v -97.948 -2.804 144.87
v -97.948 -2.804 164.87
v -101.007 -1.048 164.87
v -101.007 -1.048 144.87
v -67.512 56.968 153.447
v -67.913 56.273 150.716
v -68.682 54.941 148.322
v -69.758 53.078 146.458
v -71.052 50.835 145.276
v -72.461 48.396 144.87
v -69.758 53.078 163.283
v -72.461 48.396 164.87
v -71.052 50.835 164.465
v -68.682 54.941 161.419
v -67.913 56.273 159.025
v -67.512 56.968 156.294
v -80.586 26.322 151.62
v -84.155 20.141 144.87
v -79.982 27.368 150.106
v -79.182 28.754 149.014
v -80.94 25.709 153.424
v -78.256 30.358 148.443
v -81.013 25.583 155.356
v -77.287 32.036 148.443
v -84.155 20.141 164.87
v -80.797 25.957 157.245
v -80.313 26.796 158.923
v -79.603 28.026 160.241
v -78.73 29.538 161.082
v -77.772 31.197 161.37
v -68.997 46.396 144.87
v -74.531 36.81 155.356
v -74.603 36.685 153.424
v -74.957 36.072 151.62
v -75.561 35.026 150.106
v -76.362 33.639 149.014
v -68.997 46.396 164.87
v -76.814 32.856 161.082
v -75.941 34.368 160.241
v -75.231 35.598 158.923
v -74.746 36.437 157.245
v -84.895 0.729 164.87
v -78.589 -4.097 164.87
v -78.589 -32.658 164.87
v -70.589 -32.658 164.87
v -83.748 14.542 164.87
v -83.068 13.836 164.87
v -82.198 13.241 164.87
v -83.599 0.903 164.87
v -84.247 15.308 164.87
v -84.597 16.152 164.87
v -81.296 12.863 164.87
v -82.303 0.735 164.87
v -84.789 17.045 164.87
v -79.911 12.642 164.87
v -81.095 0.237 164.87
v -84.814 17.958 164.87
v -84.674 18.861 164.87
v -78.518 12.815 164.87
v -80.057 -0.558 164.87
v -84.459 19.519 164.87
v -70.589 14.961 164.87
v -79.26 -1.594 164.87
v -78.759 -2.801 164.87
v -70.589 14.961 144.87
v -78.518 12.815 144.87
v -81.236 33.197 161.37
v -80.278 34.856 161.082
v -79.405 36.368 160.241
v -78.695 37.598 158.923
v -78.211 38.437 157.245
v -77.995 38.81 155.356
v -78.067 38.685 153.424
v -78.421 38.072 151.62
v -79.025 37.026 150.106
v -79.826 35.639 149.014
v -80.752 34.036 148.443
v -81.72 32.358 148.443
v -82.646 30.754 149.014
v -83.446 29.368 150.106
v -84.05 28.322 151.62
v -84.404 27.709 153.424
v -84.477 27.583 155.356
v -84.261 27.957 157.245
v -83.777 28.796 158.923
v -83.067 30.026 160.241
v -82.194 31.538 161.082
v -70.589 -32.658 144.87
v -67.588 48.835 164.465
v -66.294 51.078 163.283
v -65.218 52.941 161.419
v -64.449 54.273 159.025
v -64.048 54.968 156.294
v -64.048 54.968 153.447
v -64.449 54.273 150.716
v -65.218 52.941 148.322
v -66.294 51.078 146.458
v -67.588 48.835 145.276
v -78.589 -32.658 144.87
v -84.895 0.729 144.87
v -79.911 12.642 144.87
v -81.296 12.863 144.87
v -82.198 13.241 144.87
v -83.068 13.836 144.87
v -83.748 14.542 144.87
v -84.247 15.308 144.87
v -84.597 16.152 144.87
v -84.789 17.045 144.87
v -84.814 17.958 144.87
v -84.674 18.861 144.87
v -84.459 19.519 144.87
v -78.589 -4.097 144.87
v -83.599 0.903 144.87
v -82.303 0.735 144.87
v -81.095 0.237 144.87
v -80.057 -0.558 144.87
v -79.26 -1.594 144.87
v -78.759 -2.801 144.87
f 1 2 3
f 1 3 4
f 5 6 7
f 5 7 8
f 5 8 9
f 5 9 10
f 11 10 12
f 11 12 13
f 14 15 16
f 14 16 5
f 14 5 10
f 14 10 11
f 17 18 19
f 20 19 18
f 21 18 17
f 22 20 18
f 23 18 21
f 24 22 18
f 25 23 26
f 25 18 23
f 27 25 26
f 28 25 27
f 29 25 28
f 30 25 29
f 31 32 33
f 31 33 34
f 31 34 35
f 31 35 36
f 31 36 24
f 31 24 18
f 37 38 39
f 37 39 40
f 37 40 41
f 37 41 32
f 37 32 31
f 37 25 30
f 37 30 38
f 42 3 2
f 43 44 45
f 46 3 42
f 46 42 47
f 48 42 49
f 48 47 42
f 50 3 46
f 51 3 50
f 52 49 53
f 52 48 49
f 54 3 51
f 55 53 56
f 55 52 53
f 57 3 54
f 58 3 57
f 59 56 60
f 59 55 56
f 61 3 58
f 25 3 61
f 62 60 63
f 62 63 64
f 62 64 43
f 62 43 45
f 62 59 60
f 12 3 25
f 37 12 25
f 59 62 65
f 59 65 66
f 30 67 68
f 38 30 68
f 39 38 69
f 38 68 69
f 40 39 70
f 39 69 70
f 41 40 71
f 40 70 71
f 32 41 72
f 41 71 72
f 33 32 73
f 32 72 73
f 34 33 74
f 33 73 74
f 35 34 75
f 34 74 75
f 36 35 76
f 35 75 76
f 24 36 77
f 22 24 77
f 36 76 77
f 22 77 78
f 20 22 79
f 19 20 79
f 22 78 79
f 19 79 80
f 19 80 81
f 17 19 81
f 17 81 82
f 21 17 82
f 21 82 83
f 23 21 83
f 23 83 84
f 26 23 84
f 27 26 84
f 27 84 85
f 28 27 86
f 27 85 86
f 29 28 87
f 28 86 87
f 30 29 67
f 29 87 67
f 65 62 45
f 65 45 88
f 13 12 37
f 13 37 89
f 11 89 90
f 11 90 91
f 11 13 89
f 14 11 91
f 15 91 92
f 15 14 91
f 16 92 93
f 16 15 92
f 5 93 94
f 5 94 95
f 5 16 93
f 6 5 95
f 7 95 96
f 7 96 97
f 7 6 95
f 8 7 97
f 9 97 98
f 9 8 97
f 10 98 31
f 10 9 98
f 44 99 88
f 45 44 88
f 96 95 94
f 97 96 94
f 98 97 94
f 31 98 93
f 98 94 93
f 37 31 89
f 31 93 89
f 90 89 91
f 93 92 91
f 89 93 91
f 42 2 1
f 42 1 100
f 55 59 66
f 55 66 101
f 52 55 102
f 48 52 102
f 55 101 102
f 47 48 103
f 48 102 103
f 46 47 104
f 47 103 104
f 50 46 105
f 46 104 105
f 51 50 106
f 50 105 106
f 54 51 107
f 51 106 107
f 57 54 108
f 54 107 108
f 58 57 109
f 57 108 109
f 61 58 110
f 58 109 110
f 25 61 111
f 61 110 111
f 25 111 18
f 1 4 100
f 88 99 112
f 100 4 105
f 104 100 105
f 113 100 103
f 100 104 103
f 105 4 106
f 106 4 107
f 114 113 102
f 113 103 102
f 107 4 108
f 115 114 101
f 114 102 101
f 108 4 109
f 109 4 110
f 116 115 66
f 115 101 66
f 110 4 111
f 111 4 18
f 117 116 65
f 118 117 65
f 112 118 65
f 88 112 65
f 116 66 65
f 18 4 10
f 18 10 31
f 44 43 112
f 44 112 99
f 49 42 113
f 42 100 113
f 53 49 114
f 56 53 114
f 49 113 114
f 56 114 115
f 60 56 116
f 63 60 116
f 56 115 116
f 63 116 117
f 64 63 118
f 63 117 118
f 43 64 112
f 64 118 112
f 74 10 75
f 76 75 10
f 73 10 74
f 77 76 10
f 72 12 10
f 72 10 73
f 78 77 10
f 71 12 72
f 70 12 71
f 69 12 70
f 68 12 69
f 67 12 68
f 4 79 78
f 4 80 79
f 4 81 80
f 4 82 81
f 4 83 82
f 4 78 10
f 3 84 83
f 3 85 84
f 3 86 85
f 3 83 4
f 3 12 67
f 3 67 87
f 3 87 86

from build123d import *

# Parameters (mm, degrees)
BOSS_EXTRU_1_DEPTH      = 20
CONG_1_R                = 5
CHANFREIN1_SIZE2        = 5
CHANFREIN1_SIZE         = 3.535545122
BOSS_EXTRU_2_DEPTH      = 4
ESQUISSE9_W             = 20
ESQUISSE9_H             = 48.160254038
ENL_V_MAT_EXTRU_5_DEPTH = 2
ESQUISSE10_R            = 6.5
ENL_V_MAT_EXTRU_6_DEPTH = 4


with BuildPart() as part:
    # Esquisse1 → Boss.-Extru.1 (new body)
    with BuildSketch(Plane.XY.offset(164.870489571)):
        Polygon((-68.588600326, 5.142765071), (-68.588600326, 15.502551901), (-78.588600326, 12.796044343), (-90.211700696, 9.650243444), (-68.996801706, 46.395526372), (-72.460903321, 48.395526372), (-102.774849854, -4.109769201), (-78.588600326, 2.436257514), (-78.588600326, -32.657702137), (-68.588600326, -32.657702137), align=None)
    extrude(amount=-BOSS_EXTRU_1_DEPTH)

    # Congé1
    cong_1_edges = [part.edges().sort_by_distance(p)[0] for p in [
        (-90.211700696, 9.650243444, 154.870489571),
        (-78.588600326, 2.436257514, 154.870489571),
    ]]
    fillet(cong_1_edges, radius=CONG_1_R)

    # Chanfrein1
    chanfrein1_edges = [part.edges().sort_by_distance(p)[0] for p in [
        (-102.774849854, -4.109769201, 154.870489571),
    ]]
    chamfer(chanfrein1_edges, length=CHANFREIN1_SIZE, length2=CHANFREIN1_SIZE2)

    # Esquisse8 → Boss.-Extru.2 (add)
    with BuildSketch(Plane(origin=(-75.301555125, 43.475373122, 0), x_dir=(0, 0, 1), z_dir=(-0.866025404, 0.5, 0))):
        with BuildLine():
            Line((144.870489571, 5.681303607), (164.870489571, 5.681303607))
            ThreePointArc((164.870489571, 5.681303607), (154.870489571, 15.681303607), (144.870489571, 5.681303607))
        make_face()
    extrude(amount=-BOSS_EXTRU_2_DEPTH)

    # Esquisse9 → Enlèv. mat.-Extru.5 (cut)
    with BuildSketch(Plane(origin=(-68.588600326, 0, 0), x_dir=(0, 0, -1), z_dir=(1, 0, 0))):
        with Locations((-154.870489571, -8.577575118)):
            Rectangle(ESQUISSE9_W, ESQUISSE9_H)
    extrude(amount=-ENL_V_MAT_EXTRU_5_DEPTH, mode=Mode.SUBTRACT)

    # Esquisse10 → Enlèv. mat.-Extru.6 (cut)
    with BuildSketch(Plane(origin=(-75.301555125, 43.475373122, 0), x_dir=(0, 0, 1), z_dir=(-0.866025404, 0.5, 0))):
        with Locations((154.870489571, -11.868696393)):
            Circle(ESQUISSE10_R)
    extrude(amount=-ENL_V_MAT_EXTRU_6_DEPTH, mode=Mode.SUBTRACT)


solid = part.part
